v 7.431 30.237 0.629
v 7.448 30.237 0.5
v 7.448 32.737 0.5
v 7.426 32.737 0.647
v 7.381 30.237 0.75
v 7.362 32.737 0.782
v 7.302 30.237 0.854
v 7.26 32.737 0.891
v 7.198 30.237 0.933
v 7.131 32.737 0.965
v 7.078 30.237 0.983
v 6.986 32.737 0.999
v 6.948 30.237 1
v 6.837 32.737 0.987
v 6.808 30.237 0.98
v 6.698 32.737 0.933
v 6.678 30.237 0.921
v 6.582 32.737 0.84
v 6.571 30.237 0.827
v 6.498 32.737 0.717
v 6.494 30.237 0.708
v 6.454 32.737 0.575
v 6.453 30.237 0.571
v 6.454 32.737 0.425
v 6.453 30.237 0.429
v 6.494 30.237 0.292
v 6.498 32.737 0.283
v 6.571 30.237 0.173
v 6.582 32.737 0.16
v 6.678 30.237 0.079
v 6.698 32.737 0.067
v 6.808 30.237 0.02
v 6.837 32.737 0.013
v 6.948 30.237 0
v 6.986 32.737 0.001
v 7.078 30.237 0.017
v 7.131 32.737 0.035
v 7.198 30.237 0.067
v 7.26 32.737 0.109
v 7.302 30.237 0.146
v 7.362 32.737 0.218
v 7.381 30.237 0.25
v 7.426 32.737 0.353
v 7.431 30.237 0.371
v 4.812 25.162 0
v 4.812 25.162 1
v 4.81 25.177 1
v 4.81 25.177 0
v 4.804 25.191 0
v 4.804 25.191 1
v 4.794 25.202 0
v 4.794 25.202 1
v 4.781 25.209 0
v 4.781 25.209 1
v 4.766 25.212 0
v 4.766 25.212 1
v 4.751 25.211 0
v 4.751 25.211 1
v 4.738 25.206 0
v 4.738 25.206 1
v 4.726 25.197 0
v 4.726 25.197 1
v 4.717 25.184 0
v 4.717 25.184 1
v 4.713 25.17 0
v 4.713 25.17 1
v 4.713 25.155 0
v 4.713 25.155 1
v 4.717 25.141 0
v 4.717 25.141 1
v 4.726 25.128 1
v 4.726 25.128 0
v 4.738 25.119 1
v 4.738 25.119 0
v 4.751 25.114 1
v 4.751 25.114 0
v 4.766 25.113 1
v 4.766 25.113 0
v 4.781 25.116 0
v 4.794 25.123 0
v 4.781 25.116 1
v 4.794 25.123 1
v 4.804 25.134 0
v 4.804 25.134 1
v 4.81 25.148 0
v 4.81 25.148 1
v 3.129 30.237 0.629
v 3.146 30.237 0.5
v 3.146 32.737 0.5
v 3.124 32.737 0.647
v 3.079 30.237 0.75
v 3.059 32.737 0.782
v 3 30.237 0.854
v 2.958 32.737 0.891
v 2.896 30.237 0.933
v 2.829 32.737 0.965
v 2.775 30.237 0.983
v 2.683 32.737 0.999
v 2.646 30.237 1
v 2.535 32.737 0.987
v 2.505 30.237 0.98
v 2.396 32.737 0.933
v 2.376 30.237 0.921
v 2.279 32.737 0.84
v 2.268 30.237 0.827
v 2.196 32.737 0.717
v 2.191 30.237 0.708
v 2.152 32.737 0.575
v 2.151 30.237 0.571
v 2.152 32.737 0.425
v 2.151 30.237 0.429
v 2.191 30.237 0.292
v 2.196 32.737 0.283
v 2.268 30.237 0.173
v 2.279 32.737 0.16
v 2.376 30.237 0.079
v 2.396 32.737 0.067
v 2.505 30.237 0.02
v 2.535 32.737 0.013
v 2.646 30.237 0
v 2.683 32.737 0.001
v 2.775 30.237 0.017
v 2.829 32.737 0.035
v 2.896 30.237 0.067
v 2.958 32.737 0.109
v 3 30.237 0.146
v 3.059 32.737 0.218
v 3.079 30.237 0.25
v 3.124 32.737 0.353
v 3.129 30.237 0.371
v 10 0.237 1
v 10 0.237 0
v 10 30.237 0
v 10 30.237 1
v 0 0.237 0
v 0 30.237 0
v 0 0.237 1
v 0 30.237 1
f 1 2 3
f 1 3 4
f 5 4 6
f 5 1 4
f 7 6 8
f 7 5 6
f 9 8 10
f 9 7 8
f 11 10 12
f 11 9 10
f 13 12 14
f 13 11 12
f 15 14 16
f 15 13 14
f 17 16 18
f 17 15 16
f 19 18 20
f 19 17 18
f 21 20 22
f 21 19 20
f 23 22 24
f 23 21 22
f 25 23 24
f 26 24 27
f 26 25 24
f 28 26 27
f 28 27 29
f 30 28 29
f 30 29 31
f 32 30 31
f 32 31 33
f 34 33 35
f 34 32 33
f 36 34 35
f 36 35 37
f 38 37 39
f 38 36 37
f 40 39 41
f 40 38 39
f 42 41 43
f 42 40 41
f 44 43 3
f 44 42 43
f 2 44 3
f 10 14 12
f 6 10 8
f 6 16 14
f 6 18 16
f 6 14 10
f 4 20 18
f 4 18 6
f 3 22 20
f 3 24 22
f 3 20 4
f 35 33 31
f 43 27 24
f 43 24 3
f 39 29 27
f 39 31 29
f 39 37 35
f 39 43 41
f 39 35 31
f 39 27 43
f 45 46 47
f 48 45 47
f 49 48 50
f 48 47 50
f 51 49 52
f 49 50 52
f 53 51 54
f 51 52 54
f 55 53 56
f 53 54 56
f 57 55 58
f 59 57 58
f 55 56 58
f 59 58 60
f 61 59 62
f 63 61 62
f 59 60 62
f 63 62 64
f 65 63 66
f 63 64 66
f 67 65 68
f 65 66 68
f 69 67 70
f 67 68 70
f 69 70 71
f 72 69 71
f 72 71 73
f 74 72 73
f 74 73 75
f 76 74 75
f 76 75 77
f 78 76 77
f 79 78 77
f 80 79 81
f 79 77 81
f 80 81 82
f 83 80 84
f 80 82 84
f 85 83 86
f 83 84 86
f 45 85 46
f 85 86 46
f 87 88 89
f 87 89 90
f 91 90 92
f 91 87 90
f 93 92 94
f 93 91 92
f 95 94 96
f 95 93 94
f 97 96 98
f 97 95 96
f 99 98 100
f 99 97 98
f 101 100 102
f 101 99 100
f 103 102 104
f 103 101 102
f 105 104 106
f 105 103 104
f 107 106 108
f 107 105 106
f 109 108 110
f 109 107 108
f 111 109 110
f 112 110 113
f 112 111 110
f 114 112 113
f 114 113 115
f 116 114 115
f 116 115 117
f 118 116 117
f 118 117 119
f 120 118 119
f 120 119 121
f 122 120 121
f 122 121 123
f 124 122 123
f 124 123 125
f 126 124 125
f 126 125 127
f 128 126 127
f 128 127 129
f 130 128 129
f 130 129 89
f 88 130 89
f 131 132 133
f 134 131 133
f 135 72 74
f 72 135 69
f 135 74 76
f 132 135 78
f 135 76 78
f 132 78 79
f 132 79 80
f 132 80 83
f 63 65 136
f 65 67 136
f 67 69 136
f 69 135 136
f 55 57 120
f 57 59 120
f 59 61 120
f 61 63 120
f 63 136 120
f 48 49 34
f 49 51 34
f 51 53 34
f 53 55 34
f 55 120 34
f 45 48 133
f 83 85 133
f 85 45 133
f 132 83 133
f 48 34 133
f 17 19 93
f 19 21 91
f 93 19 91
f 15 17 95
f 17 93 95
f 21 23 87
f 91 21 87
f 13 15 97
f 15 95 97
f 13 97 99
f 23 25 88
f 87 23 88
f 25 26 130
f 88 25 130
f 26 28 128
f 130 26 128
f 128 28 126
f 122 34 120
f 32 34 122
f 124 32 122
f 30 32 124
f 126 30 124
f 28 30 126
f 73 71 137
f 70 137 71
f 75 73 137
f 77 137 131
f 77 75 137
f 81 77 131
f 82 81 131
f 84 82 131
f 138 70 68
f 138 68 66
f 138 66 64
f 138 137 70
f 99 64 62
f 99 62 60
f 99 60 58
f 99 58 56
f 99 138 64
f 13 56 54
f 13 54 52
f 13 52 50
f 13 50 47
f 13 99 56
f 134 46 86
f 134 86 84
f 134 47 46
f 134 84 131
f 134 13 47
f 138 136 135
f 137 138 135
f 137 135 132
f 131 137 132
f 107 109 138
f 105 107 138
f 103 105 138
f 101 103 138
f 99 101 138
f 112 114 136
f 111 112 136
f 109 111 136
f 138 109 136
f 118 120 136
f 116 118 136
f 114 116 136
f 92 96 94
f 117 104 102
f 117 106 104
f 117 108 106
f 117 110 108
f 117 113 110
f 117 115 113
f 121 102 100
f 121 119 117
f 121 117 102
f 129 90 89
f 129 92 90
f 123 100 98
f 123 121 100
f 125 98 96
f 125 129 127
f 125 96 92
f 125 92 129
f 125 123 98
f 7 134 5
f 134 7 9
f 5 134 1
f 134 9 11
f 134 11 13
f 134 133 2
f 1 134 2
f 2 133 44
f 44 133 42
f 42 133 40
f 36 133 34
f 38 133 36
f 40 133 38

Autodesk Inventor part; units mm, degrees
ref_plane "YZ Plane" through (0, 0, 0) normal (1, 0, 0) x (0, 1, 0)
ref_plane "XZ Plane" through (0, 0, 0) normal (0, 1, 0) x (-1, 0, 0)
ref_plane "XY Plane" through (0, 0, 0) normal (0, 0, 1) x (1, 0, 0)
sketch "Sketch1" plane through (0, 0, 0) normal (0, 0, 1) x (1, 0, 0)
  line L0 (0, 0.2366) -> (10, 0.2366)
  line L1 (10, 0.2366) -> (10, 30.2366)
  line L2 (10, 30.2366) -> (0, 30.2366)
  line L3 (0, 30.2366) -> (0, 0.2366)
  point P0 (0, 0)
  dimension "d0" = 10
  dimension "d1" = 30
extrude "Extrusion1" add sketch "Sketch1" along normal blind 1
sketch "Sketch2" plane through (0, 30.2366, 0) normal (0, 1, 0) x (1, 0, 0)
  line L0 (0, 0) -> (0, -1) projected
  line L1 (0, -0.5) -> (10, -0.5)
  line L2 (0, 0) -> (10, 0) projected
  line L3 (2.646, -1) -> (2.646, 0.5163)
  line L4 (6.9484, -1) -> (6.9484, 0)
  circle A0 centre (2.646, -0.5) radius 0.5
  circle A1 centre (6.9484, -0.5) radius 0.5
  dimension "d4" = 1
extrude "Extrusion2" add sketch "Sketch2" along normal blind 2.5 contours A0 L1 L3 | L3 L1 A0 | L1 L3 A0 | A1 L1 L4 | L4 L1 A1 | L1 A0 L3 | L4 A1 L1 | L1 A1 L4
sketch "Sketch3" plane through (0, 0, 0) normal (0, 0, -1) x (-1, 0, 0)
  line L0 (-3.175, 1.5875) -> (-3.175, -3.4125)
  line L1 (-5, 1.5875) -> (-5, -3.4125)
  line L2 (-7.0347, 1.5875) -> (-7.0347, -3.4125)
  point P0 (0, 0)
  dimension "d7" = 5
  dimension "d8" = 5
  dimension "d9" = 5
sketch "Sketch4" plane through (0, 0, 1) normal (0, 0, 1) x (1, 0, 0)
  line L0 (4.7625, 30.1625) -> (4.7625, 25.1625)
  circle A0 centre (4.7625, 25.1625) radius 0.05
  point P0 (0, 0)
  dimension "d10" = 5
  dimension "d11" = 0.1
extrude "Extrusion3" cut sketch "Sketch4" against normal through all
properties part number "ir sensor"
